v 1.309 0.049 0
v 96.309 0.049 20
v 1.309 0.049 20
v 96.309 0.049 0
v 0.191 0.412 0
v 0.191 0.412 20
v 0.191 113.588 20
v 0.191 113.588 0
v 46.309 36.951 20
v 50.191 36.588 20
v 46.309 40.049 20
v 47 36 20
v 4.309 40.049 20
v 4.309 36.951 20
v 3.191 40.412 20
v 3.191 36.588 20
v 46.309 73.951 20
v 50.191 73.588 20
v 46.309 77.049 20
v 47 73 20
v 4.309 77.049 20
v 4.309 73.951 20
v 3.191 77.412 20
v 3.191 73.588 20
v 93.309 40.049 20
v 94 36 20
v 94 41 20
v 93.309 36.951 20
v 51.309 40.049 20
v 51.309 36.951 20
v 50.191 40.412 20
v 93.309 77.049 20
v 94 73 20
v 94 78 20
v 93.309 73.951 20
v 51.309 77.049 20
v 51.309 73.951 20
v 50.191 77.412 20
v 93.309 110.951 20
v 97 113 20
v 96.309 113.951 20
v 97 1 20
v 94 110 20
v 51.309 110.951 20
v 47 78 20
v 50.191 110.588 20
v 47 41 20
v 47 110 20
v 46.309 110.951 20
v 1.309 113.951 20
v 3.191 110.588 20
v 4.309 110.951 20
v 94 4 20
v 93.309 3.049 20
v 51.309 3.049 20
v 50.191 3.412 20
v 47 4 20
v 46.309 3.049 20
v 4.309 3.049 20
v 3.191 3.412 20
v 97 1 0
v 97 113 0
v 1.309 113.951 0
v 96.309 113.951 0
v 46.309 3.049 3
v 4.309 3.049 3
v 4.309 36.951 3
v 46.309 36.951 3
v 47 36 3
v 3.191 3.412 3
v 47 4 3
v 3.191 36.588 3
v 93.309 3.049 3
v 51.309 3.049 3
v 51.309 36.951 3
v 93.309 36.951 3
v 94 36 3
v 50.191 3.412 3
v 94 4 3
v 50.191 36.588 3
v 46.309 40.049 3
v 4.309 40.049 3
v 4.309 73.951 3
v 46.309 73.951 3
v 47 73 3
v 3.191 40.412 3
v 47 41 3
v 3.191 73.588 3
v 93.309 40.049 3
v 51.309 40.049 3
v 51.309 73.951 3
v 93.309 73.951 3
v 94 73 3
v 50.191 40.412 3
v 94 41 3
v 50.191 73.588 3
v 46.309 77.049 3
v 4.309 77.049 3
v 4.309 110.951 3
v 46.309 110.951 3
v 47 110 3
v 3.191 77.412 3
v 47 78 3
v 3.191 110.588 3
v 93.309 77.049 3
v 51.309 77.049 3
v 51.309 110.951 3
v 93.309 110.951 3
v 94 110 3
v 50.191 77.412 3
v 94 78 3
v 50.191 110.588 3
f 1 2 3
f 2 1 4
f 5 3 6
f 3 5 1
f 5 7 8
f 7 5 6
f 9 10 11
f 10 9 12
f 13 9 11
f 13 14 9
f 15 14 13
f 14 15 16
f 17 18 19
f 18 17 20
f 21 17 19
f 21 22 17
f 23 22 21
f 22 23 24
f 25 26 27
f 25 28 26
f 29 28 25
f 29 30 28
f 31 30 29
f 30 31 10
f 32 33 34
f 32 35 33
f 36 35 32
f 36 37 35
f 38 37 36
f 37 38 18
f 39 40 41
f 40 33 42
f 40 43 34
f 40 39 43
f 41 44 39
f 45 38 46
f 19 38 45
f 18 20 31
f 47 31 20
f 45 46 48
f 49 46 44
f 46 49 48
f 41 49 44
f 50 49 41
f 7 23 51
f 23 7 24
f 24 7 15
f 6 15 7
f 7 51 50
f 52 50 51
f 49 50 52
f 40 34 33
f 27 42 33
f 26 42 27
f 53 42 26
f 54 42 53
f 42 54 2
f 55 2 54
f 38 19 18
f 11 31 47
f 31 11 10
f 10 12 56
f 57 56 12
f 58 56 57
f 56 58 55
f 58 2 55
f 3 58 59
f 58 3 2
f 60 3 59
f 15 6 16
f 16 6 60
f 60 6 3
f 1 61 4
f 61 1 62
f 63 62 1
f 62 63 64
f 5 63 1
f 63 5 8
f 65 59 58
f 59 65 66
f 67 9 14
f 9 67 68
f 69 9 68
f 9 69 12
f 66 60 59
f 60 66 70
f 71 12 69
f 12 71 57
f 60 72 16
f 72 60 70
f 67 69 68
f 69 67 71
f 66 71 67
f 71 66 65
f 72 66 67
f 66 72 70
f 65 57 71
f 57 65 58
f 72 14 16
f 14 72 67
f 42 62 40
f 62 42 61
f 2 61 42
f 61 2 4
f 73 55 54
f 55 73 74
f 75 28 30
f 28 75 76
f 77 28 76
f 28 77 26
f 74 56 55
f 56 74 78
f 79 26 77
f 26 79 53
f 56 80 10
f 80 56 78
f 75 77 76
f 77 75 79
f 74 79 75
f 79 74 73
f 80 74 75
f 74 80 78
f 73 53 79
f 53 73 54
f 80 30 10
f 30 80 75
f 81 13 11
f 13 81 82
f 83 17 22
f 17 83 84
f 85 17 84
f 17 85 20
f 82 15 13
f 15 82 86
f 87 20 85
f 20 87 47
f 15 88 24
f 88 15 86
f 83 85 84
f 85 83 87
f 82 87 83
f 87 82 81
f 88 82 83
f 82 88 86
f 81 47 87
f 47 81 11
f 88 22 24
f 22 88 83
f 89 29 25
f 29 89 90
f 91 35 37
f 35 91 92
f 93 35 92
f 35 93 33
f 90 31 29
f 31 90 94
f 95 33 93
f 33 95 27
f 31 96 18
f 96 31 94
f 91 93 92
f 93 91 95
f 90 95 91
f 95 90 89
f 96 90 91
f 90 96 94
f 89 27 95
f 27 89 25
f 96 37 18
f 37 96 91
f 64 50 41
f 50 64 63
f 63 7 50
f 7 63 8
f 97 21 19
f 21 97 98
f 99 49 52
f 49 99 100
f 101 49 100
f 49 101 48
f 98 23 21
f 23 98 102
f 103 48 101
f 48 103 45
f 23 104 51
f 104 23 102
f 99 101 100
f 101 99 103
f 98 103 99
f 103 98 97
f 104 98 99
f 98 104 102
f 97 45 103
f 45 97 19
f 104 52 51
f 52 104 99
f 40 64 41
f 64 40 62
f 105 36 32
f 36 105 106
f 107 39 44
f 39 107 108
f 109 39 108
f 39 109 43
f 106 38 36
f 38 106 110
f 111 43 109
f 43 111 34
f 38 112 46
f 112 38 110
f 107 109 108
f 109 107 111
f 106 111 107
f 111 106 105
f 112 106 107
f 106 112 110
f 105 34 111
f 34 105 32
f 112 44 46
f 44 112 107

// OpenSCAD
//Height of tray along Z axis (all units are in MM)
boxHeight = 20;
//X width of each compartment
boxWidthX = 50;
//Y width of each compartment
boxWidthY = 40;
//Thickness of walls
wallThickness = 3;
//Size of interior/exterior fillets. I recommend you make this less than or equal to 1/2 of wall thickness.
boxFillet = 1;
//How many rows of compartments do you want?
rows = 3;
//How many columns of compartments do you want?
columns = 2;

 
module compartmentExterior () {
    hull() {
        hull() {
            translate([boxWidthX - boxFillet, boxFillet, 0]) cylinder(boxHeight, r = boxFillet);
            translate([boxFillet, boxFillet, 0]) cylinder(boxHeight, r = boxFillet);
        }
        hull() {
            translate([boxWidthX - boxFillet, boxWidthY - boxFillet, 0]) cylinder(boxHeight, r = boxFillet);
            translate([boxFillet, boxWidthY - boxFillet,0]) cylinder(boxHeight, r = boxFillet);
        }
    }
}

module compartmentOpening () {
    hull() {
        hull() {
            translate([boxWidthX - boxFillet - wallThickness, boxFillet + wallThickness, 0 + wallThickness]) cylinder(boxHeight, r = boxFillet);
            translate([boxFillet + wallThickness, boxFillet + wallThickness, wallThickness]) cylinder(boxHeight, r = boxFillet);
        }
        hull() {
            translate([boxWidthX - boxFillet - wallThickness, boxWidthY - boxFillet - wallThickness, wallThickness]) cylinder(boxHeight, r = boxFillet);
            translate([boxFillet + wallThickness, boxWidthY - boxFillet - wallThickness, wallThickness]) cylinder(boxHeight, r = boxFillet);
        }
    }
}

module compartment () {
    difference () {
        compartmentExterior();
        compartmentOpening();
    }
}


union() {
    for (y = [1:rows]) {
        translate([0, (boxWidthY*(y-1))-(wallThickness*(y-1)), 0])
        for (x = [1:columns]) {
            translate([(boxWidthX*(x-1))-(wallThickness*(x-1)), 0, 0]) compartment();
        }
    }
}
